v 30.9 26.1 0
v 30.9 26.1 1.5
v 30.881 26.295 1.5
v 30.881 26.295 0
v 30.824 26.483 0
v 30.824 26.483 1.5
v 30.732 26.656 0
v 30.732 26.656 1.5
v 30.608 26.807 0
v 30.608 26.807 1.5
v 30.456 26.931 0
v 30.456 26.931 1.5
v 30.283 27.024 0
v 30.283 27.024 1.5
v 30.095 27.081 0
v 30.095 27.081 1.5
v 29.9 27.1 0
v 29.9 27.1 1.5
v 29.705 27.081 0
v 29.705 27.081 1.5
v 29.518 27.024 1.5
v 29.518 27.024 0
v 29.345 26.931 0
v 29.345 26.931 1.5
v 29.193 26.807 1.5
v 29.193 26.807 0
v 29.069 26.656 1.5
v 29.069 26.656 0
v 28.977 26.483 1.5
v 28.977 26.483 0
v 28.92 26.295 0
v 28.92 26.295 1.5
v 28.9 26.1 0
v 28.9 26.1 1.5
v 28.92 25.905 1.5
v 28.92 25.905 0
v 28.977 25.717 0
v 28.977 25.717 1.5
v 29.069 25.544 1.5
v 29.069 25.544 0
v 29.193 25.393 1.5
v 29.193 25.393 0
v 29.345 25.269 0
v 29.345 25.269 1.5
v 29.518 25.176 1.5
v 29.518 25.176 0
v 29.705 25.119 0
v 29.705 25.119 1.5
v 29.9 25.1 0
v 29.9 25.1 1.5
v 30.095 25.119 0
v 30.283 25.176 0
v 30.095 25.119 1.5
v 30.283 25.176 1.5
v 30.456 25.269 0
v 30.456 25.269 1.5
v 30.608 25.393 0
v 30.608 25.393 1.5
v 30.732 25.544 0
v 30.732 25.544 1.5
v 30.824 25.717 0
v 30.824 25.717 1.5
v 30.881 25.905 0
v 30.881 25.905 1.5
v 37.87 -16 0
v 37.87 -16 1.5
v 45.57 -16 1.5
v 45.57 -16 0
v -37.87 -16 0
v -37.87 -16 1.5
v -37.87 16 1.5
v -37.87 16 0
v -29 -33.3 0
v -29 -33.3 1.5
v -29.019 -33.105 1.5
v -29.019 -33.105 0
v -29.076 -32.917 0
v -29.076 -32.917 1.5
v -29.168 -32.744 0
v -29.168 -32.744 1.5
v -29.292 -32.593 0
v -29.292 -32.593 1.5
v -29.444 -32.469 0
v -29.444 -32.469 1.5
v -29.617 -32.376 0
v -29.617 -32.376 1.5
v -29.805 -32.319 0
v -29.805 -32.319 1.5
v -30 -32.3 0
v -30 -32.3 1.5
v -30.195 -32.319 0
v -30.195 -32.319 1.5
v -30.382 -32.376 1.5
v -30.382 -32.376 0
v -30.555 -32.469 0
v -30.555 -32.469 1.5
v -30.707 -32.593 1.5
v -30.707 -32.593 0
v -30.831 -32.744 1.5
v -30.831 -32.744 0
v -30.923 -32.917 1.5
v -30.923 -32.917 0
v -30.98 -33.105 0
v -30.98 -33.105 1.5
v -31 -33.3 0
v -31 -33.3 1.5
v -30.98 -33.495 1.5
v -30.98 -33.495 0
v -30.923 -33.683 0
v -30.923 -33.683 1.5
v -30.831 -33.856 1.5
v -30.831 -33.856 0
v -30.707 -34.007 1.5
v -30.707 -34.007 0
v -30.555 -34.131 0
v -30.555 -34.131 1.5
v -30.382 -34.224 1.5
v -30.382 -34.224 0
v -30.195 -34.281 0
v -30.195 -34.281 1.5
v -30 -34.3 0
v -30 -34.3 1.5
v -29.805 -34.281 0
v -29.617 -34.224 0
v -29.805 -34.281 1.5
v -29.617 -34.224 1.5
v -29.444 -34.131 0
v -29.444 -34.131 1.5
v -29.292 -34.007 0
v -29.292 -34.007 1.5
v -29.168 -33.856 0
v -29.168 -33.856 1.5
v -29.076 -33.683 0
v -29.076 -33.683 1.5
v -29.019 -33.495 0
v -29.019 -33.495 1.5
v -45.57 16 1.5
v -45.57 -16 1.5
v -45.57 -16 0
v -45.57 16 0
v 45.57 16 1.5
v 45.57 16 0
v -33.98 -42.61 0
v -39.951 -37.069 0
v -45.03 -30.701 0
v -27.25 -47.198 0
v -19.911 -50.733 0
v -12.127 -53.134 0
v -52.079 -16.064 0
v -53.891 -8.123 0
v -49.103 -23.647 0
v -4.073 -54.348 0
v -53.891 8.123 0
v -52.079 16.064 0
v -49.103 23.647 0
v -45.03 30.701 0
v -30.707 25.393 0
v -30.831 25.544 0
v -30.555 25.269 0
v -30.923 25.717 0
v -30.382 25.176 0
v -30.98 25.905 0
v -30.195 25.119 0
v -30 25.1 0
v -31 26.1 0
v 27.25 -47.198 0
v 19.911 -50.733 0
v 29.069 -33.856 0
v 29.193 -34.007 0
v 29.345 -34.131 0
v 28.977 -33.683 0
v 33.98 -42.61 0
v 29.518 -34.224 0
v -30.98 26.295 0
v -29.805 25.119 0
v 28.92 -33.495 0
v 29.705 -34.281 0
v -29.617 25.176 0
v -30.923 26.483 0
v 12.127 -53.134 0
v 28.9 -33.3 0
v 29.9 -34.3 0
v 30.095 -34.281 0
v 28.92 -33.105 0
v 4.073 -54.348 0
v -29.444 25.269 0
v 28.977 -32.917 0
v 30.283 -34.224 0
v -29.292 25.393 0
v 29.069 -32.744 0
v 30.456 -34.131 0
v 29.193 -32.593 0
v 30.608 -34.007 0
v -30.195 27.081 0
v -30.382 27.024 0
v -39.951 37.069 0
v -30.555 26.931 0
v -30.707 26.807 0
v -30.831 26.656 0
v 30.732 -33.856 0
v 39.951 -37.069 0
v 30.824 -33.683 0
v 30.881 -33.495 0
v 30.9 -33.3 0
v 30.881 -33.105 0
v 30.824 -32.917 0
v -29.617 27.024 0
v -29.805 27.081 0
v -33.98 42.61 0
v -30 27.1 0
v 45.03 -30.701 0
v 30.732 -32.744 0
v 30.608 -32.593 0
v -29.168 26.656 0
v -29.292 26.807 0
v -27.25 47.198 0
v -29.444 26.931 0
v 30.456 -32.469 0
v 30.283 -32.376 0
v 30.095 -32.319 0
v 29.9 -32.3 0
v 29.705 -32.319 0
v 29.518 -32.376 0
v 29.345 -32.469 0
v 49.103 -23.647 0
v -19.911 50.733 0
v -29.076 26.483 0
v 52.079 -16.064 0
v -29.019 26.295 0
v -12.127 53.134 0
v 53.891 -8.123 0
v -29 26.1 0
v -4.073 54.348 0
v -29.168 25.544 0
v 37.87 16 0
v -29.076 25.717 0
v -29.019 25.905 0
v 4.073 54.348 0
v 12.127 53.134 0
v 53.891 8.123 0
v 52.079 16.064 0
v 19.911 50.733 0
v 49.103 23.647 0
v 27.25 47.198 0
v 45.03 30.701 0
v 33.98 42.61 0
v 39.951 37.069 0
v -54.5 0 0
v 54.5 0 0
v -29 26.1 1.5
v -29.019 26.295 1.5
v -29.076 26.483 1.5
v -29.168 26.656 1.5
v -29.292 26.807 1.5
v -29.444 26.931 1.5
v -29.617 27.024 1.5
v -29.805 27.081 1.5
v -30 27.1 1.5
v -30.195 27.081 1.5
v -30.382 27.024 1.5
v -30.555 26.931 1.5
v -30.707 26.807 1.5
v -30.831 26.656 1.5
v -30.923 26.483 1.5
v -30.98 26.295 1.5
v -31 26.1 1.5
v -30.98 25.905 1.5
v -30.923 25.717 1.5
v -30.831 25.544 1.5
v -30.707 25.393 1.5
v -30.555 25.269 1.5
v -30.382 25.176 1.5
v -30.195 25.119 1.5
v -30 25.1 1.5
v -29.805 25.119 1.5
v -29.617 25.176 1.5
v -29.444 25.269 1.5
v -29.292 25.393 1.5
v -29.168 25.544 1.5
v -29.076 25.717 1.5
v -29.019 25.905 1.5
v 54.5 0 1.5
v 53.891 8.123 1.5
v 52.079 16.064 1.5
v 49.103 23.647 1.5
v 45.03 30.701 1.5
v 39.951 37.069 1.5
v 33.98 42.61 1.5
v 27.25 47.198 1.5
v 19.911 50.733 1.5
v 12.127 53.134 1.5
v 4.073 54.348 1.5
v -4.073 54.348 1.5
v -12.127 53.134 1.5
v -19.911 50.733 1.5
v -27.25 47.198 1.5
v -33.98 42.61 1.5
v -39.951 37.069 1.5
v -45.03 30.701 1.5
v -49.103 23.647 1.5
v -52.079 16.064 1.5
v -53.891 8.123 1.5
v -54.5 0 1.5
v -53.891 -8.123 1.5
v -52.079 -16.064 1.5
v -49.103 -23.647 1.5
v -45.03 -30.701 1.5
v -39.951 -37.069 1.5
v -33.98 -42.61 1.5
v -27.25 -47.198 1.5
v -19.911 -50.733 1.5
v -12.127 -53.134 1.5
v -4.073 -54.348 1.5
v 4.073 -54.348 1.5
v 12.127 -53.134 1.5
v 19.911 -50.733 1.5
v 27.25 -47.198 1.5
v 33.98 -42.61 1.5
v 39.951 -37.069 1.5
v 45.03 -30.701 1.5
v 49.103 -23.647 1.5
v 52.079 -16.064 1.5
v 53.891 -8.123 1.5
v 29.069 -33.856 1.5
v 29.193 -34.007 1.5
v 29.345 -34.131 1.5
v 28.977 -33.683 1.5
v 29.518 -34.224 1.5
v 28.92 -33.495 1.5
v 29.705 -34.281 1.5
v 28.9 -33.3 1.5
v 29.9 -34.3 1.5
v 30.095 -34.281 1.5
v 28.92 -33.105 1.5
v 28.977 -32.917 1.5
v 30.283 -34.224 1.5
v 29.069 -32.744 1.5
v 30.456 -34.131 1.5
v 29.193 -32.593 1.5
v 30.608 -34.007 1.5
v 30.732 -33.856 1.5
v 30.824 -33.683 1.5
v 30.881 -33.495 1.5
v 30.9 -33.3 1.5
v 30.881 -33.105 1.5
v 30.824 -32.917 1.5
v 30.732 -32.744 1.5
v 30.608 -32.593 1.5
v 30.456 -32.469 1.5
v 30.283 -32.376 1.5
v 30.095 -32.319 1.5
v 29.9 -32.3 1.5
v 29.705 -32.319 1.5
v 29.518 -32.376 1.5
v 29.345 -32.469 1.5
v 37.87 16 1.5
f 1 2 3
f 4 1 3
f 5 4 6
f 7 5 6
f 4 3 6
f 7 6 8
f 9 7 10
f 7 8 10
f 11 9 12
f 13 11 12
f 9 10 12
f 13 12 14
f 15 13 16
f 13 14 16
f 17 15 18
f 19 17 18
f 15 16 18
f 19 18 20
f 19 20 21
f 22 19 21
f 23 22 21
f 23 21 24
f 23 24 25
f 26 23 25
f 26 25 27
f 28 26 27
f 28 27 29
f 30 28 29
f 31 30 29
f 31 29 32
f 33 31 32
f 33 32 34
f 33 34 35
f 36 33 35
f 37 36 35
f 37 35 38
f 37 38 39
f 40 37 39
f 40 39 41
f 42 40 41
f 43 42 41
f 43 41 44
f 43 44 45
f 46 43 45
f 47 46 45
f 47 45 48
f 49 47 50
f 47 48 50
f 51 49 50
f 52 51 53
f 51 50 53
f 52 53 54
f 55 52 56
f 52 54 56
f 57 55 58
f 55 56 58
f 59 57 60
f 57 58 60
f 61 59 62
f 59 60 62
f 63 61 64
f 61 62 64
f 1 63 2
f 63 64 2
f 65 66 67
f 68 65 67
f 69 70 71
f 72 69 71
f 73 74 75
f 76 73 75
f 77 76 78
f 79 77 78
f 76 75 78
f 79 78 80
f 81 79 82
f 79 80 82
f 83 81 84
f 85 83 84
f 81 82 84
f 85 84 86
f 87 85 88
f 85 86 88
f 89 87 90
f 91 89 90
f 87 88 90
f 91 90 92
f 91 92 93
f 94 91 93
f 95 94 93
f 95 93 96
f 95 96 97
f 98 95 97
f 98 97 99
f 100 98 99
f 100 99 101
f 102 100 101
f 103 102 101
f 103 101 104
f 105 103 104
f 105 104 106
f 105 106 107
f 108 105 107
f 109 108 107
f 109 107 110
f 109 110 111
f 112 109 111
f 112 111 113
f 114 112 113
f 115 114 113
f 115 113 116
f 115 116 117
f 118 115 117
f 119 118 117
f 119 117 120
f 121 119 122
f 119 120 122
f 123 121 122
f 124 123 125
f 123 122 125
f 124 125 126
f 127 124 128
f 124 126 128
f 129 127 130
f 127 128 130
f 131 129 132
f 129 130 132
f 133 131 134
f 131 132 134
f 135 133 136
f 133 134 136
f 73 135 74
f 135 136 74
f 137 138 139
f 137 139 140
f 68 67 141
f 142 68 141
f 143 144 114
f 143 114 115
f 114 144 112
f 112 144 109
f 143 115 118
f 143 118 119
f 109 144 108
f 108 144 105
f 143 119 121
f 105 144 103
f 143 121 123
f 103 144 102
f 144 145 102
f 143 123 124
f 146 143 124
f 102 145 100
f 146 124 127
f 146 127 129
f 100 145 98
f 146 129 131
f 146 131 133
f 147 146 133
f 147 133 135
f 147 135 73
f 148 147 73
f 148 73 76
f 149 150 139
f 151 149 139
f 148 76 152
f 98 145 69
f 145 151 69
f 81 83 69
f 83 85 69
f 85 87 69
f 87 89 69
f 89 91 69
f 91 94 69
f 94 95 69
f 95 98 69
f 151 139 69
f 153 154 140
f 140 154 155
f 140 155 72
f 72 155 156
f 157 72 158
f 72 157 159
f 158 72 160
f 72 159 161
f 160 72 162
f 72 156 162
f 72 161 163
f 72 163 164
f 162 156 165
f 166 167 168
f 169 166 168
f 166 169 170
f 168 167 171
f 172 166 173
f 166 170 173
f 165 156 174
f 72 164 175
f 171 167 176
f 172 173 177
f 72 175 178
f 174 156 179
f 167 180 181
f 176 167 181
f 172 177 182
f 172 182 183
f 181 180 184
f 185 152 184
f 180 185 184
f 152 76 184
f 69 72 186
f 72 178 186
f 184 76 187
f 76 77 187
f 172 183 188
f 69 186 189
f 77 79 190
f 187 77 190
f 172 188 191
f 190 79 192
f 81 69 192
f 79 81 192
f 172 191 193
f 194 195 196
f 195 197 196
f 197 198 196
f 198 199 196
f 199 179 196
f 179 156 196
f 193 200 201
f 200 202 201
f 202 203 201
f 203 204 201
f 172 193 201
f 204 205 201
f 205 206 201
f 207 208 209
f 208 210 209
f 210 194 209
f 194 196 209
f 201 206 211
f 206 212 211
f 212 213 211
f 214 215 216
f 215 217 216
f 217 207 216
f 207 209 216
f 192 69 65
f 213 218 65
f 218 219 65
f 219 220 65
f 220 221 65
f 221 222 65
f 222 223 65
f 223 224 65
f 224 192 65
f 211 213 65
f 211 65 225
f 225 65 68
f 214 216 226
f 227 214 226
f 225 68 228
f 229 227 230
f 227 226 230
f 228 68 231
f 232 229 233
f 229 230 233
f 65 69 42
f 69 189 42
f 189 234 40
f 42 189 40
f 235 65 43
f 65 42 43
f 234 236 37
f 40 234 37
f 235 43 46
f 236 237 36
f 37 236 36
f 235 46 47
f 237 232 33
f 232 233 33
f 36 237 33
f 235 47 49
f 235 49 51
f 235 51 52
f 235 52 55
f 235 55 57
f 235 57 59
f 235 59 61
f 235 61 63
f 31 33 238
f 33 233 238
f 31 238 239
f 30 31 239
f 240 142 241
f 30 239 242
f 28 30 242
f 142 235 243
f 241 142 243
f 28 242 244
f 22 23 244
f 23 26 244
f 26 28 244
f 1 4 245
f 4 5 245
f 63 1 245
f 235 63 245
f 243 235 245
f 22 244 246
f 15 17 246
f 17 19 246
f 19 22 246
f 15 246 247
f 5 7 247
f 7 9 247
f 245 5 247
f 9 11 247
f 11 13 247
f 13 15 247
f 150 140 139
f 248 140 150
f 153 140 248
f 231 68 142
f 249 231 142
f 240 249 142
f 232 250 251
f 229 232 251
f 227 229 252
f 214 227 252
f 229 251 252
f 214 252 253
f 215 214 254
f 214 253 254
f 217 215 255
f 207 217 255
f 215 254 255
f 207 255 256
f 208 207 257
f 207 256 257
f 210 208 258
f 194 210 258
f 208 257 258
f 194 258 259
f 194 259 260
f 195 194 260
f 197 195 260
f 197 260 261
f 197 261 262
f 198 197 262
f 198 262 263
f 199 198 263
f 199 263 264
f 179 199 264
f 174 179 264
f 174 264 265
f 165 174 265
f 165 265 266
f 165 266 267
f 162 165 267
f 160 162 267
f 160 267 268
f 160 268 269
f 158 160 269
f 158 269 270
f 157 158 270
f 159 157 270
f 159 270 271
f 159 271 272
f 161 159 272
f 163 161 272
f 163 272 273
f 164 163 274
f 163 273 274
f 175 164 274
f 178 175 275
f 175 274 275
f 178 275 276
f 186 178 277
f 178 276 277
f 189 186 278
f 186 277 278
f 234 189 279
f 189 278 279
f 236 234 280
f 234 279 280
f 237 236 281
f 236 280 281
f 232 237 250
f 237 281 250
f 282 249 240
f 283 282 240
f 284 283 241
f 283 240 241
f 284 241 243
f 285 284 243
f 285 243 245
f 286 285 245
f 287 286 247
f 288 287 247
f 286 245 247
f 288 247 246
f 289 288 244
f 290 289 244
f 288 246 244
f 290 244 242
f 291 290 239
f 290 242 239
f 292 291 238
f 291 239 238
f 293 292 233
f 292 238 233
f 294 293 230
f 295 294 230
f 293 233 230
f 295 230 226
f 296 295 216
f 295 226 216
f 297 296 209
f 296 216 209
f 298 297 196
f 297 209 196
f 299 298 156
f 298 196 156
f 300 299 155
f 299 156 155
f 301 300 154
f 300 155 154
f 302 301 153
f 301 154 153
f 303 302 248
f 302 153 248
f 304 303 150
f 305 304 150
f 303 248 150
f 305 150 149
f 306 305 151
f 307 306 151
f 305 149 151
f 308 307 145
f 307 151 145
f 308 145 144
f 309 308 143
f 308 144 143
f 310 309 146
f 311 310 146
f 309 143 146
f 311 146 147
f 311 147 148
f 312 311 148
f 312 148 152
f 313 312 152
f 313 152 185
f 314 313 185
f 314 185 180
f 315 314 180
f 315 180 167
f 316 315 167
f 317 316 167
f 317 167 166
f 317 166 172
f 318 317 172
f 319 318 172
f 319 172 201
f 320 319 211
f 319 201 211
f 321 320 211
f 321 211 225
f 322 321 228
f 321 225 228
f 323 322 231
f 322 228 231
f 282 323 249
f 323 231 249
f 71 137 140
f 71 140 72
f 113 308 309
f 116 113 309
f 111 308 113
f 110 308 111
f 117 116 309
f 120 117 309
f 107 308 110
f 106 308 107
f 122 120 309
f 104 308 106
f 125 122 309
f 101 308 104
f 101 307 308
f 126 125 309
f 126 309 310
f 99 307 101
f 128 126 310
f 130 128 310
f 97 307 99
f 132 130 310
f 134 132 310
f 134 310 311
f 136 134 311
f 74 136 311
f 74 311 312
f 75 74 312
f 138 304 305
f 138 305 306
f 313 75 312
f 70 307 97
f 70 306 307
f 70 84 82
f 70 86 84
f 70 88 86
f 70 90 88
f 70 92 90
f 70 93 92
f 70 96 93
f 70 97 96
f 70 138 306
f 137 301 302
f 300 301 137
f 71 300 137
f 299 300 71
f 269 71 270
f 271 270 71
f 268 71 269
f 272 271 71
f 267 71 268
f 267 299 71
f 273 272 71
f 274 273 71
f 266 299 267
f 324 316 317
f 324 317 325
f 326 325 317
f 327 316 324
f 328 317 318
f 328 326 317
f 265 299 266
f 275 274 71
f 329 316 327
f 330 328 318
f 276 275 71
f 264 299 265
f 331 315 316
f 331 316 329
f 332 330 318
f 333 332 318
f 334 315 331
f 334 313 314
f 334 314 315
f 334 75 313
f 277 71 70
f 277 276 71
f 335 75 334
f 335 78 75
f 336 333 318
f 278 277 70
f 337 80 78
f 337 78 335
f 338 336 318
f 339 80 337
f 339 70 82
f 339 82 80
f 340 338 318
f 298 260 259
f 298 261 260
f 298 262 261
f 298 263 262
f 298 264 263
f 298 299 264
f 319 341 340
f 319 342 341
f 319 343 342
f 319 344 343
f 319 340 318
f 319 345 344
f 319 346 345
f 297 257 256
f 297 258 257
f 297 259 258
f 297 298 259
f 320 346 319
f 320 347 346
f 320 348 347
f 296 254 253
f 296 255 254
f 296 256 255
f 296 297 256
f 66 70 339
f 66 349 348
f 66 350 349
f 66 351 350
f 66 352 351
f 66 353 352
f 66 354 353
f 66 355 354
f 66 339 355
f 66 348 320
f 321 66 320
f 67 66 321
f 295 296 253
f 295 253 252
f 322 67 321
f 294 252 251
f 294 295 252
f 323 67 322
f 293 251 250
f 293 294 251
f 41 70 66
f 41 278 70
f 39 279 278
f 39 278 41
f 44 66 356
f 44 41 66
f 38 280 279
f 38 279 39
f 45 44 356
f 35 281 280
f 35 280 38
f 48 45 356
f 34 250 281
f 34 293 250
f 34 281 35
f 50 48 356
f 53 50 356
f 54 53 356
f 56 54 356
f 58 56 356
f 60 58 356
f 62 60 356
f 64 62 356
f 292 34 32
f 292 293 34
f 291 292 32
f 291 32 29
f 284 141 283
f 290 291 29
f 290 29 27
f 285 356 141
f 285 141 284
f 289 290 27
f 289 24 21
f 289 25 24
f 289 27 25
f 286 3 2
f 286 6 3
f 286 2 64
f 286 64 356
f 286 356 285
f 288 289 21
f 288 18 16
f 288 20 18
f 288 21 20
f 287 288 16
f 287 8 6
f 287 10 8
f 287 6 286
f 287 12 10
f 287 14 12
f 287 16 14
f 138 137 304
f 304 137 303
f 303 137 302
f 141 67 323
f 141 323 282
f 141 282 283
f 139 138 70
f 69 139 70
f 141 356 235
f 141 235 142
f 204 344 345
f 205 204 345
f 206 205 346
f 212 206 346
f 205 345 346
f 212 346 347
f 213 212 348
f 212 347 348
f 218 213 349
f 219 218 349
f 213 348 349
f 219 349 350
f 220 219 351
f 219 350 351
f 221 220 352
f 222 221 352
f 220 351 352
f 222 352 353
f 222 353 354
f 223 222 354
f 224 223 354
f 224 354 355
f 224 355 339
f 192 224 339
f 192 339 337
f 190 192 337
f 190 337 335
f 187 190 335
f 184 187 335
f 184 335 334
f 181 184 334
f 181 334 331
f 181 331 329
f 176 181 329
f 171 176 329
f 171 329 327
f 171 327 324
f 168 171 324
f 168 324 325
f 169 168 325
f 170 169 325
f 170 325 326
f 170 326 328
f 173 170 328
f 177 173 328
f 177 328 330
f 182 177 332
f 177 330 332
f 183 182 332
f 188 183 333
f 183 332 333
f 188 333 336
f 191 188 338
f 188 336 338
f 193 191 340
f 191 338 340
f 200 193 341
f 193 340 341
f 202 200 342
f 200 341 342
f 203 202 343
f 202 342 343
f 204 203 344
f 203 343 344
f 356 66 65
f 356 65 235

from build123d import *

# Parameters (mm, degrees)
SKETCH1_R                = 54.5
BOSS_EXTRUDE1_DEPTH      = 1.5
SKETCH2_R                = 1
CUT_EXTRUDE1_DEPTH       = 1.58
SKICA1_W                 = 7.7
SKICA1_H                 = 32
ODEBRAT_VYSUNUT_M1_DEPTH = 1.5


with BuildPart() as part:
    # Sketch1 → Boss-Extrude1 (new body)
    with BuildSketch(Plane.XY):
        Circle(SKETCH1_R)
    extrude(amount=BOSS_EXTRUDE1_DEPTH)

    # Sketch2 → Cut-Extrude1 (cut)
    with BuildSketch(Plane.XY.offset(1.5)):
        with Locations((29.900398584, 26.1)):
            Circle(SKETCH2_R)
        with Locations((29.900398584, -33.3)):
            Circle(SKETCH2_R)
        with Locations((-29.999601416, -33.3)):
            Circle(SKETCH2_R)
        with Locations((-29.999601416, 26.1)):
            Circle(SKETCH2_R)
    extrude(amount=-CUT_EXTRUDE1_DEPTH, mode=Mode.SUBTRACT)

    # Skica1 → Odebrat vysunutím1 (cut)
    with BuildSketch(Plane.XY.offset(1.5)):
        with Locations((41.7205, 0)):
            Rectangle(SKICA1_W, SKICA1_H)
        with Locations((-41.7205, 0)):
            Rectangle(SKICA1_W, SKICA1_H)
    extrude(amount=-ODEBRAT_VYSUNUT_M1_DEPTH, mode=Mode.SUBTRACT)


solid = part.part
